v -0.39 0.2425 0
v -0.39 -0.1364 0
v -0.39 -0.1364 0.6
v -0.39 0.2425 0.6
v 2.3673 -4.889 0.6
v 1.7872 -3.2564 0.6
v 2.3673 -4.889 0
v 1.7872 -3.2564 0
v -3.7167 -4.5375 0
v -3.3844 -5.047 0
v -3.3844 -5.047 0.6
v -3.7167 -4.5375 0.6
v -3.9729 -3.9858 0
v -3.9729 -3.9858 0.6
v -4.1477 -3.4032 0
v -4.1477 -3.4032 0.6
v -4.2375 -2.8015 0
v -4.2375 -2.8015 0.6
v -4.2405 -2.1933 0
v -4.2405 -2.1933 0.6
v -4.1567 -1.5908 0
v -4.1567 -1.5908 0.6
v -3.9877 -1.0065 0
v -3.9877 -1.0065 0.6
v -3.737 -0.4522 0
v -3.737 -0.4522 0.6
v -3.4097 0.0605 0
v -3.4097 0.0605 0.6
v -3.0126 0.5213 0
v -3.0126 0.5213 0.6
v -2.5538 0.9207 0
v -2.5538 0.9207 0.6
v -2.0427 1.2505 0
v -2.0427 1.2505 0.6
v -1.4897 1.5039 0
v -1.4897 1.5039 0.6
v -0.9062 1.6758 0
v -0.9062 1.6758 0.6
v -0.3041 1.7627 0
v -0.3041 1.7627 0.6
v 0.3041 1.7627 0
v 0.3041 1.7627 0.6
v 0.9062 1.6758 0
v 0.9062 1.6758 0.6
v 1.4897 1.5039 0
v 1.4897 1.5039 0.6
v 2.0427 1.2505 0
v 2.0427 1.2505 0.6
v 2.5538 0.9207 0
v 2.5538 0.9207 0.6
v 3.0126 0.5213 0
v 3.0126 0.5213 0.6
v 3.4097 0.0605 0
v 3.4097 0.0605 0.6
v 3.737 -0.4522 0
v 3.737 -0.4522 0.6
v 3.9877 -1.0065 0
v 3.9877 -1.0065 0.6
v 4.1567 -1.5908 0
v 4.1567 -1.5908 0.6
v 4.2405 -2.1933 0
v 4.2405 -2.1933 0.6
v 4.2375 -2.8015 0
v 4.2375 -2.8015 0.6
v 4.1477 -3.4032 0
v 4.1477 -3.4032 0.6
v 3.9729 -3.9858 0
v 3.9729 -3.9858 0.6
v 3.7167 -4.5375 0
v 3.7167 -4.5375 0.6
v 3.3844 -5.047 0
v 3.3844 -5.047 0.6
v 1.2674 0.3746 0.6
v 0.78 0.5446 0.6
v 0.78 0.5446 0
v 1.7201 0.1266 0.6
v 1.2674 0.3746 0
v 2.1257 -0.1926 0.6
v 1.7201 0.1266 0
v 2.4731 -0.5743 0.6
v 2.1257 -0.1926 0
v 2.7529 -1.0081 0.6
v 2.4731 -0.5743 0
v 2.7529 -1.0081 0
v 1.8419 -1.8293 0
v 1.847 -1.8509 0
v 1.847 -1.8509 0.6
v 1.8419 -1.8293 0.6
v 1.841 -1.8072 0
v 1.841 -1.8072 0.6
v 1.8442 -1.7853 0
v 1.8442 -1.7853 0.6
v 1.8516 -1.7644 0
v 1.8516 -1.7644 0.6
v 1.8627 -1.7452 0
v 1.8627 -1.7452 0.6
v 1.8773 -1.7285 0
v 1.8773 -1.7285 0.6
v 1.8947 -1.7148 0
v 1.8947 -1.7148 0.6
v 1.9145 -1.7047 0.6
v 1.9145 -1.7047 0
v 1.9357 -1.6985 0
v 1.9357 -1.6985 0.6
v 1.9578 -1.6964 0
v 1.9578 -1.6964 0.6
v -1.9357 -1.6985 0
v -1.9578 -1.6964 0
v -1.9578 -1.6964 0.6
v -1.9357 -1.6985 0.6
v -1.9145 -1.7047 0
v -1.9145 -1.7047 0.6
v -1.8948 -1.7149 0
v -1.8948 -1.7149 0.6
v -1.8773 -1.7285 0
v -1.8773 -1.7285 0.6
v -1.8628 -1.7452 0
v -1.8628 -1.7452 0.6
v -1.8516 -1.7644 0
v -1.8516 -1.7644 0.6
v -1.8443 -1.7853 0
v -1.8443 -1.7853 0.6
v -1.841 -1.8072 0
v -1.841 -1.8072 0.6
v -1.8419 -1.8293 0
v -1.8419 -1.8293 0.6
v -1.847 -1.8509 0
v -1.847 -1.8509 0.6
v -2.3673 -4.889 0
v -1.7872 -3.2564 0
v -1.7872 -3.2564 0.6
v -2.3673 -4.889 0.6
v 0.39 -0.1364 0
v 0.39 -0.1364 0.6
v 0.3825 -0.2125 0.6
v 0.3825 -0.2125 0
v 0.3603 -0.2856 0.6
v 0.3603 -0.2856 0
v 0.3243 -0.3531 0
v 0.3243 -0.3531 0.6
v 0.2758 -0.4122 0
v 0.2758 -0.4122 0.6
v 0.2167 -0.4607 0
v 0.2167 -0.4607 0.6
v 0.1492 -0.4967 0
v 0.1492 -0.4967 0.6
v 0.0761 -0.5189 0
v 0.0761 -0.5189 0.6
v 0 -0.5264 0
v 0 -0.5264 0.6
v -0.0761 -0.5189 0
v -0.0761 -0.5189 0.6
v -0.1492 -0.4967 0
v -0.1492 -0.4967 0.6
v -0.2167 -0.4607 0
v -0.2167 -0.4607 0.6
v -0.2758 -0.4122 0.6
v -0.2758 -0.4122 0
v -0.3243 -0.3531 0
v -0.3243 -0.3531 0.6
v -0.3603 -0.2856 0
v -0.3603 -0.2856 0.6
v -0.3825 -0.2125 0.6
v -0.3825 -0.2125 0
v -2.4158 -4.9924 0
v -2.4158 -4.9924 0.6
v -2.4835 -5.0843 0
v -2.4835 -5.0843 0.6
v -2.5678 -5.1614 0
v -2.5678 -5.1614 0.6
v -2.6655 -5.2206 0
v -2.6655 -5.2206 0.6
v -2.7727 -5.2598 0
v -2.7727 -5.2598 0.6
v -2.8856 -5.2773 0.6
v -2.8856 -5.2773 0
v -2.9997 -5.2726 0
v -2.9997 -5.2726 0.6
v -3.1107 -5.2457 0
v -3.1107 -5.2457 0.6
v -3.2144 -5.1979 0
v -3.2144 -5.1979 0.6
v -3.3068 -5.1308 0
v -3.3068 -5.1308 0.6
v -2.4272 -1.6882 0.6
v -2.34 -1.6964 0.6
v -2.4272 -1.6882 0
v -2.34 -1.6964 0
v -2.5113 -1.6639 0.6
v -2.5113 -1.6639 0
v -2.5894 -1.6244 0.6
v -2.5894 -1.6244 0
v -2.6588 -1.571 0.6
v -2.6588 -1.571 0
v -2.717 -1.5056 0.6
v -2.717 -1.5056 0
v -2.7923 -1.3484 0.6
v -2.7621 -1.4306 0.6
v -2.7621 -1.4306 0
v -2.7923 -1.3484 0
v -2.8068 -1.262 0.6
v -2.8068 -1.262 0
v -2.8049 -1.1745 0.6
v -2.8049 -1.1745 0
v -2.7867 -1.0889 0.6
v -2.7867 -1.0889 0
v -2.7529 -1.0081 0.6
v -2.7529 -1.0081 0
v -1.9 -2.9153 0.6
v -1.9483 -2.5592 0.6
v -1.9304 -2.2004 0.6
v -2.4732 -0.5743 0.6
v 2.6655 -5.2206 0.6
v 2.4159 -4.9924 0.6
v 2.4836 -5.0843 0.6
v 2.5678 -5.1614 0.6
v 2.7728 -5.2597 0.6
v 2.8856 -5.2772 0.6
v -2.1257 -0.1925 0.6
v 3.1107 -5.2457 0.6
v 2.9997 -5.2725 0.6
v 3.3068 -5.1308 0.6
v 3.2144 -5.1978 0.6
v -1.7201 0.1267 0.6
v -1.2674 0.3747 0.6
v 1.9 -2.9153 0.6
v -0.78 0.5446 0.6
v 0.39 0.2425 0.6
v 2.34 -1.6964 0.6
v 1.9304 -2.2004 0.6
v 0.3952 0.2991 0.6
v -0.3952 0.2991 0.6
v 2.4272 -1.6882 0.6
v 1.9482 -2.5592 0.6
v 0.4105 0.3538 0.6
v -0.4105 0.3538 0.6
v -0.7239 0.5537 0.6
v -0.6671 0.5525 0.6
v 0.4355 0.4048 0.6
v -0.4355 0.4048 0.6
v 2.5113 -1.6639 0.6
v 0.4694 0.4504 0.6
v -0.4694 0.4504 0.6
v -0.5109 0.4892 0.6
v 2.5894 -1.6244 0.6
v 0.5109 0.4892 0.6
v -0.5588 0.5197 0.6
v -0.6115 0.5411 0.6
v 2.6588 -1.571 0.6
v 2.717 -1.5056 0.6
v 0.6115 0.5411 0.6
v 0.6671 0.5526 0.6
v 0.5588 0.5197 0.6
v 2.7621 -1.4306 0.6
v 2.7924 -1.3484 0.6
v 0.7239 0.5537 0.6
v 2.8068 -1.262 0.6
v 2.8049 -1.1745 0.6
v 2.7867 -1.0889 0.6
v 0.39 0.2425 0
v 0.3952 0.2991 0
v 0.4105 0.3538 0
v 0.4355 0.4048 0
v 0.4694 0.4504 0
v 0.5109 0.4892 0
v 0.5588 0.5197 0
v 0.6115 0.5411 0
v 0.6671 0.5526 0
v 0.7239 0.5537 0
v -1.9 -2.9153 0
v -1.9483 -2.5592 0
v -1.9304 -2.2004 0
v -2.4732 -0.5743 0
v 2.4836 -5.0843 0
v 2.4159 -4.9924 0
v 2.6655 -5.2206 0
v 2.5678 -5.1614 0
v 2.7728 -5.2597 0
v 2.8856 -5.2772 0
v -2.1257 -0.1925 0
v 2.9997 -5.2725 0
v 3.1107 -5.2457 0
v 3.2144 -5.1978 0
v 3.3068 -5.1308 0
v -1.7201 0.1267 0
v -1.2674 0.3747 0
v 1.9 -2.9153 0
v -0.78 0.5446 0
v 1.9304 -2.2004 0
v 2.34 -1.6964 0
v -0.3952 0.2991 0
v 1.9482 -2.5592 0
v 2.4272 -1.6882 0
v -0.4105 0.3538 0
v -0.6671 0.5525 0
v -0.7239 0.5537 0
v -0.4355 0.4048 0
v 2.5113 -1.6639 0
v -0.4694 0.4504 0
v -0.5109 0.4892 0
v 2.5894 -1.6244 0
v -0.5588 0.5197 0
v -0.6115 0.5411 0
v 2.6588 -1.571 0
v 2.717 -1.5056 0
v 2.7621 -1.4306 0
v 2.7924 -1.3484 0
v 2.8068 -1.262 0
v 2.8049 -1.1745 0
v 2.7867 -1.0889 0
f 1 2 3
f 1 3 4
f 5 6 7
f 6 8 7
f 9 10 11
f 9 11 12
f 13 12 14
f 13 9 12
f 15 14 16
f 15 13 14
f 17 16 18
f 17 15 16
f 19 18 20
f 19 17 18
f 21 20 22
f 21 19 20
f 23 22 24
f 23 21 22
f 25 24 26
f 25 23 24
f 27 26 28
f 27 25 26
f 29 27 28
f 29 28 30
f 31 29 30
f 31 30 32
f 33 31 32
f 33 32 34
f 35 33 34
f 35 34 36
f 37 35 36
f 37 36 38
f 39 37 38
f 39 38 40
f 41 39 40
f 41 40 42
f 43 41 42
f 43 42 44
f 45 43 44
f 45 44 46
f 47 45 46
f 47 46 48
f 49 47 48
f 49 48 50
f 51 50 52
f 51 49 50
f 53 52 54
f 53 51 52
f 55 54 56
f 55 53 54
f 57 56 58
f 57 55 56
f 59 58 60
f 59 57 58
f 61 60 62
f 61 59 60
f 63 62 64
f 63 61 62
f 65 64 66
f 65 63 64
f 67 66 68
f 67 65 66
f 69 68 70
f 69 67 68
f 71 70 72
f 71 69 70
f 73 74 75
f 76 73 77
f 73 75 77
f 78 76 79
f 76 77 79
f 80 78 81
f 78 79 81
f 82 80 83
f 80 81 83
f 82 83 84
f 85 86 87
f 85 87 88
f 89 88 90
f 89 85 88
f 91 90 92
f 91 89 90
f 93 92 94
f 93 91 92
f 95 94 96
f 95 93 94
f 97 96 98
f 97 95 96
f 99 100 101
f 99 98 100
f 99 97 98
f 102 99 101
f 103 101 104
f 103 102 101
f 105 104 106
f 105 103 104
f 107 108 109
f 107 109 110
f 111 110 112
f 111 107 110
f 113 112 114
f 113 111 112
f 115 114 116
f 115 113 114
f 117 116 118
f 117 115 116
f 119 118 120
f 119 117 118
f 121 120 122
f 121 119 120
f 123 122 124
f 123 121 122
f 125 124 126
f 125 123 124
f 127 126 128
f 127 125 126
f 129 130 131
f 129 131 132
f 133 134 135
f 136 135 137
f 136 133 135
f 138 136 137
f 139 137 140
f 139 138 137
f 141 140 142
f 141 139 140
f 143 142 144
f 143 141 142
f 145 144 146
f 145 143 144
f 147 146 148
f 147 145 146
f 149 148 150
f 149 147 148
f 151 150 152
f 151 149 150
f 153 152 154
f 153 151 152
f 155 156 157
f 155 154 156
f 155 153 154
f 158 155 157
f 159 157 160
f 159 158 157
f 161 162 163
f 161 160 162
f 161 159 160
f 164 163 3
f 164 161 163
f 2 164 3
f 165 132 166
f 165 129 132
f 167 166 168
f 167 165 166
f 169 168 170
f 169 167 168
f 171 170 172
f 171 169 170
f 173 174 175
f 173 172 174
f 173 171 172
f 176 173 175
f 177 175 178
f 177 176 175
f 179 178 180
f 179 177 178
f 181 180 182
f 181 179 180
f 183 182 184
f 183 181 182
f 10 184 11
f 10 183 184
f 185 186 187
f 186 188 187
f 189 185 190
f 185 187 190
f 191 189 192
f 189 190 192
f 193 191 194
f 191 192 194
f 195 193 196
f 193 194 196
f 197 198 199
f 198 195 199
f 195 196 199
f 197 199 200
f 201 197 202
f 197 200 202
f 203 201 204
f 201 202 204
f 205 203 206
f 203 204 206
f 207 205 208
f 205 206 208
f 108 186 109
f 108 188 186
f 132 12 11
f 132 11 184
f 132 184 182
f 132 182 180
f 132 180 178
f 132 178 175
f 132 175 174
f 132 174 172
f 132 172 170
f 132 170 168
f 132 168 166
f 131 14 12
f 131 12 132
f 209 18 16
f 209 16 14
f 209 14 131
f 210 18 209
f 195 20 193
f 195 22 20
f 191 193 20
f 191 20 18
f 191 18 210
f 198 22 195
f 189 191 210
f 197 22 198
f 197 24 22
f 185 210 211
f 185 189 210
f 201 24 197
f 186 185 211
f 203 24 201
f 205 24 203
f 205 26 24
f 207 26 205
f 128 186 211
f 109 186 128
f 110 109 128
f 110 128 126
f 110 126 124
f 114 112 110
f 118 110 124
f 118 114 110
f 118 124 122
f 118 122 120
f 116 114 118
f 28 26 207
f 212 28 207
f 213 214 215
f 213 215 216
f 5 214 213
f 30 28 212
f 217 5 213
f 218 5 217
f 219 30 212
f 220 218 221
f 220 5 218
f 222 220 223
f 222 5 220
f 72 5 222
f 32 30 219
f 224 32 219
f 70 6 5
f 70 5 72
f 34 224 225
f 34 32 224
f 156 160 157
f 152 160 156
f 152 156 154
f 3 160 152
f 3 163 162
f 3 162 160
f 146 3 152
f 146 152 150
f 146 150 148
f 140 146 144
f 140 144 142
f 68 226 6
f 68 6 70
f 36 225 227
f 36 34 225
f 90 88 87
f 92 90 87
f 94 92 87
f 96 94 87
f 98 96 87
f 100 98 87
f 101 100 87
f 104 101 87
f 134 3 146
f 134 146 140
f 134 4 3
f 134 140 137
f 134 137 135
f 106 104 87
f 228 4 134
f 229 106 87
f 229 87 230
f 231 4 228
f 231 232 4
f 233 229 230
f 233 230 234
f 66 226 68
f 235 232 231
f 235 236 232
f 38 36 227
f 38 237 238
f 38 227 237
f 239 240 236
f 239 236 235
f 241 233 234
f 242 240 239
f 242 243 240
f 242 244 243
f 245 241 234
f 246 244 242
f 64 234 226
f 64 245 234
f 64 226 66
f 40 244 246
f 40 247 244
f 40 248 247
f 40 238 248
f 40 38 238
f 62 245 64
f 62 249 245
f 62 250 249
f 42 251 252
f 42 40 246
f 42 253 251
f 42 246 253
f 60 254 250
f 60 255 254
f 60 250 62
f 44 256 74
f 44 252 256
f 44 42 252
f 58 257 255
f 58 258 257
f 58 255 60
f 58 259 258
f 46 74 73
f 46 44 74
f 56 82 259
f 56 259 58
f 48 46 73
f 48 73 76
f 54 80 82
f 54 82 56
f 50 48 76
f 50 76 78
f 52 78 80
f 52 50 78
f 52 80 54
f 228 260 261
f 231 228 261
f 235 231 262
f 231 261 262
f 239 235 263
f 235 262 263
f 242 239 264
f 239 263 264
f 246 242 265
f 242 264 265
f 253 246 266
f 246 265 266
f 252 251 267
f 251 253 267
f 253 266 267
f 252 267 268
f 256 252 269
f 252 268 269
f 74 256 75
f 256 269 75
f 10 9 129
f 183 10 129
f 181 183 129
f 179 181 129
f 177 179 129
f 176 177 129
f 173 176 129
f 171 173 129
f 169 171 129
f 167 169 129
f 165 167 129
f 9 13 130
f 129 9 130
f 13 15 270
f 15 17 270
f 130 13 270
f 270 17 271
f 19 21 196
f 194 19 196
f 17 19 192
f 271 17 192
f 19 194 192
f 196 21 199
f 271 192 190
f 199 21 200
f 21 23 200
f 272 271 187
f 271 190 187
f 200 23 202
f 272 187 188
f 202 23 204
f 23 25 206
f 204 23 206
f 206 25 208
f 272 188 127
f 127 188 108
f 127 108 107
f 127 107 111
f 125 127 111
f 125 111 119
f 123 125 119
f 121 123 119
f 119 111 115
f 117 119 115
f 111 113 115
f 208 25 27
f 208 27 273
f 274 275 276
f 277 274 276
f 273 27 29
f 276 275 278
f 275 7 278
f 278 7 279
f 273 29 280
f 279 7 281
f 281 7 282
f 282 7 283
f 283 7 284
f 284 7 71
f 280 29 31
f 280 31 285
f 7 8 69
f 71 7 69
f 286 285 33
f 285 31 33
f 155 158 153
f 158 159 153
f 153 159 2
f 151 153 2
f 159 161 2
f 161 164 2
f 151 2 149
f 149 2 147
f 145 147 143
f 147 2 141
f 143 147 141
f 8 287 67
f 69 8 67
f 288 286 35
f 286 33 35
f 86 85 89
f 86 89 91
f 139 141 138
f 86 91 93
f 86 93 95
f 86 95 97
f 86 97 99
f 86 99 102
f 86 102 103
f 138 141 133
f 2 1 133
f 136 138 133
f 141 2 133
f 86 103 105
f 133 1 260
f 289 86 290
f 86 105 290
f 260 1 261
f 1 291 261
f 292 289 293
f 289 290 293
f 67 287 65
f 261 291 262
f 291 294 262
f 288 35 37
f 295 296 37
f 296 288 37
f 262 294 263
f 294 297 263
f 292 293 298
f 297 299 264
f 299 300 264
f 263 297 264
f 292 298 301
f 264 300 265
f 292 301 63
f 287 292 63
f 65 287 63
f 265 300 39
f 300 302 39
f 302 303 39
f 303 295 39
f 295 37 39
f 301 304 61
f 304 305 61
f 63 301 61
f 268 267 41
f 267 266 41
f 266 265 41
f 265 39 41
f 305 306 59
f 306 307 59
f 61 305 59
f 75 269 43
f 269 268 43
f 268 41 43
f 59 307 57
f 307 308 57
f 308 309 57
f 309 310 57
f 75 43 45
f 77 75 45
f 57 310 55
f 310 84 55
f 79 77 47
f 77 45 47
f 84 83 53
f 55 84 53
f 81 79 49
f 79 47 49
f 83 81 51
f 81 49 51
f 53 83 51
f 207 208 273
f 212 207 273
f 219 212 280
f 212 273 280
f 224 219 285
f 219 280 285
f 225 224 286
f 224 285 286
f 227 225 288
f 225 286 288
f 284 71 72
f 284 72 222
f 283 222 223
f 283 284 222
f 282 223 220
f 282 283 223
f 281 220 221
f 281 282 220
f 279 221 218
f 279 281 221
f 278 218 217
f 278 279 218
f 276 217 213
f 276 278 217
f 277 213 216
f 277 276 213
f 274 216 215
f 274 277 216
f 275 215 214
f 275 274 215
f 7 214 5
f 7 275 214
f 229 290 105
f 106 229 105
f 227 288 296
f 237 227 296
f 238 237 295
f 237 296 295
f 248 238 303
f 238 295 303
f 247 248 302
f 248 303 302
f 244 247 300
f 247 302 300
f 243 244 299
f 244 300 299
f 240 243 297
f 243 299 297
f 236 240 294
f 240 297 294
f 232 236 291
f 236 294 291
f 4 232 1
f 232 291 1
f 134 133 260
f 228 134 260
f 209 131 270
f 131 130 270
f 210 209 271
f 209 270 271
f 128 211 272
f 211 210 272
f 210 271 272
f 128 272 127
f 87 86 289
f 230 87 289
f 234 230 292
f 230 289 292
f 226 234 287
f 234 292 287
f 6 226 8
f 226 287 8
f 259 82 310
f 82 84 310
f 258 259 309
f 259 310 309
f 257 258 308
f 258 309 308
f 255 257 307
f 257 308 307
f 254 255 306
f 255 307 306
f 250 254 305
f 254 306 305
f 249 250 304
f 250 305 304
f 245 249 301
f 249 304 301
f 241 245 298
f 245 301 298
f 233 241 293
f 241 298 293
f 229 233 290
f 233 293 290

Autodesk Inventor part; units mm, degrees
ref_plane "YZ Plane" through (0, 0, 0) normal (1, 0, 0) x (0, 1, 0)
ref_plane "XZ Plane" through (0, 0, 0) normal (0, 1, 0) x (-1, 0, 0)
sketch "Sketch1" plane through (0, 0, 0) normal (0, 0, 1) x (1, 0, 0)
  circle A0 centre (0, -2.4764) radius 2.5 construction
  line L0 (-0.39, 0.0236) -> (0, 0.0236) construction
  line L1 (-3.206, 0) -> (3.4858, 0) projected
  line L2 (-1.7872, -3.2564) -> (1.7872, -3.2564) construction
  arc A1 (-1.847, -1.8509) -> (-1.7872, -3.2564) centre (0, -2.4764) ccw
  line L3 (0, 1.949) -> (0, -3.4788) projected
  arc A2 (-0.39, -0.1364) -> (0.39, -0.1364) centre (0, -0.1364) ccw
  arc A3 (3.3844, -5.047) -> (-3.3844, -5.047) centre (0, -2.4764) ccw
  line L4 (-2.34, -1.6964) -> (-1.9578, -1.6964)
  line L5 (-0.39, -0.1364) -> (-0.39, 0.2425)
  arc A4 (-0.78, 0.5446) -> (-2.7529, -1.0081) centre (0, -2.4764) ccw
  arc A5 (-0.39, 0.2425) -> (-0.78, 0.5446) centre (-0.702, 0.2425) ccw
  arc A6 (-2.7529, -1.0081) -> (-2.34, -1.6964) centre (-2.34, -1.2284) ccw
  arc A7 (-1.847, -1.8509) -> (-1.9578, -1.6964) centre (-1.9578, -1.8134) ccw
  line L6 (0, 1.7736) -> (2.5298, 1.7736) construction
  line L7 (-1.7872, -3.2564) -> (-2.3673, -4.889)
  arc A8 (-3.3844, -5.047) -> (-2.3673, -4.889) centre (-2.9185, -4.6932) ccw
  line L8 (0, -0.5264) -> (-1.2778, -0.5264) construction
  line L9 (1.7872, -3.2564) -> (2.3673, -4.889)
  arc A9 (2.3673, -4.889) -> (3.3844, -5.047) centre (2.9185, -4.6932) ccw
  arc A10 (1.7872, -3.2564) -> (1.847, -1.8509) centre (0, -2.4764) ccw
  line L10 (2.34, -1.6964) -> (1.9578, -1.6964)
  line L11 (0.39, -0.1364) -> (0.39, 0.2425)
  arc A11 (2.7529, -1.0081) -> (0.78, 0.5446) centre (0, -2.4764) ccw
  arc A12 (0.78, 0.5446) -> (0.39, 0.2425) centre (0.702, 0.2425) ccw
  arc A13 (2.34, -1.6964) -> (2.7529, -1.0081) centre (2.34, -1.2284) ccw
  arc A14 (1.9578, -1.6964) -> (1.847, -1.8509) centre (1.9578, -1.8134) ccw
  point P0 (0.39, 0.0236)
  dimension "d0" = 5
  dimension "d3" = 0.78
  dimension "d4" = 0.39
  dimension "d5" = 8.5
  dimension "d8" = 3.12
  dimension "d9" = 0.78
  dimension "d10" = 0.312
  dimension "d11" = 0.468
  dimension "d12" = 0.117
  dimension "d13" = 0.585
  dimension "d14" = 1.95
  dimension "d15" = 1.95
extrude "Body" add sketch "Sketch1" along normal blind 0.6 contours A4 A6 L4 A7 A1 L7 A8 A3 L3 L1 L5 A5 | L1 L3 A2 L5 | L3 A3 L1 A11 A12 L11 | L1 L11 A2 L3 | L1 A3 A9 L9 A10 A14 L10 A13 A11
ref_plane "Work Plane1" through (0, -2.4764, 0) normal (-1, 0, 0) x (0, 0, 1)
equation "\"d0\" = WD"
equation "\"d3\" = 0.2 * ND"
equation "\"d4\" = 0.1 * ND"
equation "\"d5\" = SD2"
equation "\"d8\" = 0.8 * ND"
equation "\"d9\" = 0.2 * ND"
equation "\"d10\" = 0.08 * ND"
equation "\"d11\" = 0.12 * ND"
equation "\"d12\" = 0.03 * ND"
equation "\"d13\" = 0.15 * ND"
equation "\"d14\" = 0.5 * ND"
equation "\"d15\" = 0.5 * ND"
equation "\"d16\" = SD"
equation "\"ND\" = 3.9"
equation "\"SD\" = 0.6"
equation "\"WD\" = WDMIN"
equation "\"d1\" = 1.6 * ND"
equation "\"d2\" = ND"
equation "\"SD2\" = 8.5"
equation "\"d6\" = ND"
equation "\"d7\" = 0.15 * ND"
equation "\"WDMIN\" = 5"
equation "\"SNB\" = 0.7"
equation "\"WDMAX\" = 6"
equation "\"BUBRMI\" = 1.1"
properties part number "ANSI B27.7 - 5, E" material "Steel, Mild"
